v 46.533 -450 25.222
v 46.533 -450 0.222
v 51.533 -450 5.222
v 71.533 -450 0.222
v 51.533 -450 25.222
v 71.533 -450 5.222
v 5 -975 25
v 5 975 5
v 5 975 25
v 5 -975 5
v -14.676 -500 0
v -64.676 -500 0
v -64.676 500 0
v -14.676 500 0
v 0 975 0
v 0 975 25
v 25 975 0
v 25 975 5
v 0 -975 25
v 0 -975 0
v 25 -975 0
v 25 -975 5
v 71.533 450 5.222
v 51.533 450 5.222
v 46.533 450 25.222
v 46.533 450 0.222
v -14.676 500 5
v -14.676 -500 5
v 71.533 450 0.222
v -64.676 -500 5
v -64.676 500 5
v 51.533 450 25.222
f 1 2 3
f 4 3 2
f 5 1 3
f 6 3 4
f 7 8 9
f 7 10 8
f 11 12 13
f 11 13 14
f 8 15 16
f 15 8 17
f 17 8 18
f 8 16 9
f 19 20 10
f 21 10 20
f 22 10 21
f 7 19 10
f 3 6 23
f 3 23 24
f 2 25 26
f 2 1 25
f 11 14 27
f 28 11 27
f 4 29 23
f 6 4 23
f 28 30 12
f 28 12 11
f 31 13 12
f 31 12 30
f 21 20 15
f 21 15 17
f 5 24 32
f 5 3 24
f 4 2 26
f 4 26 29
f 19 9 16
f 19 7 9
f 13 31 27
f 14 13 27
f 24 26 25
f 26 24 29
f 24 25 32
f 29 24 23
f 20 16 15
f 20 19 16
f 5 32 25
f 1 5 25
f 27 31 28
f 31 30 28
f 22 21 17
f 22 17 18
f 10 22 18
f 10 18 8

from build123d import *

# Parameters (mm, degrees)
F1_DEPTH = 975
F3_DEPTH = 450
F4_W     = 50
F4_H     = 5
F5_DEPTH = 500


with BuildPart() as f1:
    # F0 (on Front) → F1 (new body, symmetric)
    with BuildSketch(Plane.XZ):
        Polygon((0, 25), (0, 0), (25, 0), (25, 5), (5, 5), (5, 25), align=None)
    extrude(amount=F1_DEPTH, both=True)


with BuildPart() as f3:
    # F2 (on Front) → F3 (new body, symmetric)
    with BuildSketch(Plane.XZ):
        Polygon((46.533303, 25.222328), (46.533303, 0.222328), (71.533303, 0.222328), (71.533303, 5.222328), (51.533303, 5.222328), (51.533303, 25.222328), align=None)
    extrude(amount=F3_DEPTH, both=True)


with BuildPart() as f5:
    # F4 (on Front) → F5 (new body, symmetric)
    with BuildSketch(Plane.XZ):
        with Locations((-39.676264, 2.5)):
            Rectangle(F4_W, F4_H)
    extrude(amount=F5_DEPTH, both=True)


solid = Compound([f1.part, f3.part, f5.part])
